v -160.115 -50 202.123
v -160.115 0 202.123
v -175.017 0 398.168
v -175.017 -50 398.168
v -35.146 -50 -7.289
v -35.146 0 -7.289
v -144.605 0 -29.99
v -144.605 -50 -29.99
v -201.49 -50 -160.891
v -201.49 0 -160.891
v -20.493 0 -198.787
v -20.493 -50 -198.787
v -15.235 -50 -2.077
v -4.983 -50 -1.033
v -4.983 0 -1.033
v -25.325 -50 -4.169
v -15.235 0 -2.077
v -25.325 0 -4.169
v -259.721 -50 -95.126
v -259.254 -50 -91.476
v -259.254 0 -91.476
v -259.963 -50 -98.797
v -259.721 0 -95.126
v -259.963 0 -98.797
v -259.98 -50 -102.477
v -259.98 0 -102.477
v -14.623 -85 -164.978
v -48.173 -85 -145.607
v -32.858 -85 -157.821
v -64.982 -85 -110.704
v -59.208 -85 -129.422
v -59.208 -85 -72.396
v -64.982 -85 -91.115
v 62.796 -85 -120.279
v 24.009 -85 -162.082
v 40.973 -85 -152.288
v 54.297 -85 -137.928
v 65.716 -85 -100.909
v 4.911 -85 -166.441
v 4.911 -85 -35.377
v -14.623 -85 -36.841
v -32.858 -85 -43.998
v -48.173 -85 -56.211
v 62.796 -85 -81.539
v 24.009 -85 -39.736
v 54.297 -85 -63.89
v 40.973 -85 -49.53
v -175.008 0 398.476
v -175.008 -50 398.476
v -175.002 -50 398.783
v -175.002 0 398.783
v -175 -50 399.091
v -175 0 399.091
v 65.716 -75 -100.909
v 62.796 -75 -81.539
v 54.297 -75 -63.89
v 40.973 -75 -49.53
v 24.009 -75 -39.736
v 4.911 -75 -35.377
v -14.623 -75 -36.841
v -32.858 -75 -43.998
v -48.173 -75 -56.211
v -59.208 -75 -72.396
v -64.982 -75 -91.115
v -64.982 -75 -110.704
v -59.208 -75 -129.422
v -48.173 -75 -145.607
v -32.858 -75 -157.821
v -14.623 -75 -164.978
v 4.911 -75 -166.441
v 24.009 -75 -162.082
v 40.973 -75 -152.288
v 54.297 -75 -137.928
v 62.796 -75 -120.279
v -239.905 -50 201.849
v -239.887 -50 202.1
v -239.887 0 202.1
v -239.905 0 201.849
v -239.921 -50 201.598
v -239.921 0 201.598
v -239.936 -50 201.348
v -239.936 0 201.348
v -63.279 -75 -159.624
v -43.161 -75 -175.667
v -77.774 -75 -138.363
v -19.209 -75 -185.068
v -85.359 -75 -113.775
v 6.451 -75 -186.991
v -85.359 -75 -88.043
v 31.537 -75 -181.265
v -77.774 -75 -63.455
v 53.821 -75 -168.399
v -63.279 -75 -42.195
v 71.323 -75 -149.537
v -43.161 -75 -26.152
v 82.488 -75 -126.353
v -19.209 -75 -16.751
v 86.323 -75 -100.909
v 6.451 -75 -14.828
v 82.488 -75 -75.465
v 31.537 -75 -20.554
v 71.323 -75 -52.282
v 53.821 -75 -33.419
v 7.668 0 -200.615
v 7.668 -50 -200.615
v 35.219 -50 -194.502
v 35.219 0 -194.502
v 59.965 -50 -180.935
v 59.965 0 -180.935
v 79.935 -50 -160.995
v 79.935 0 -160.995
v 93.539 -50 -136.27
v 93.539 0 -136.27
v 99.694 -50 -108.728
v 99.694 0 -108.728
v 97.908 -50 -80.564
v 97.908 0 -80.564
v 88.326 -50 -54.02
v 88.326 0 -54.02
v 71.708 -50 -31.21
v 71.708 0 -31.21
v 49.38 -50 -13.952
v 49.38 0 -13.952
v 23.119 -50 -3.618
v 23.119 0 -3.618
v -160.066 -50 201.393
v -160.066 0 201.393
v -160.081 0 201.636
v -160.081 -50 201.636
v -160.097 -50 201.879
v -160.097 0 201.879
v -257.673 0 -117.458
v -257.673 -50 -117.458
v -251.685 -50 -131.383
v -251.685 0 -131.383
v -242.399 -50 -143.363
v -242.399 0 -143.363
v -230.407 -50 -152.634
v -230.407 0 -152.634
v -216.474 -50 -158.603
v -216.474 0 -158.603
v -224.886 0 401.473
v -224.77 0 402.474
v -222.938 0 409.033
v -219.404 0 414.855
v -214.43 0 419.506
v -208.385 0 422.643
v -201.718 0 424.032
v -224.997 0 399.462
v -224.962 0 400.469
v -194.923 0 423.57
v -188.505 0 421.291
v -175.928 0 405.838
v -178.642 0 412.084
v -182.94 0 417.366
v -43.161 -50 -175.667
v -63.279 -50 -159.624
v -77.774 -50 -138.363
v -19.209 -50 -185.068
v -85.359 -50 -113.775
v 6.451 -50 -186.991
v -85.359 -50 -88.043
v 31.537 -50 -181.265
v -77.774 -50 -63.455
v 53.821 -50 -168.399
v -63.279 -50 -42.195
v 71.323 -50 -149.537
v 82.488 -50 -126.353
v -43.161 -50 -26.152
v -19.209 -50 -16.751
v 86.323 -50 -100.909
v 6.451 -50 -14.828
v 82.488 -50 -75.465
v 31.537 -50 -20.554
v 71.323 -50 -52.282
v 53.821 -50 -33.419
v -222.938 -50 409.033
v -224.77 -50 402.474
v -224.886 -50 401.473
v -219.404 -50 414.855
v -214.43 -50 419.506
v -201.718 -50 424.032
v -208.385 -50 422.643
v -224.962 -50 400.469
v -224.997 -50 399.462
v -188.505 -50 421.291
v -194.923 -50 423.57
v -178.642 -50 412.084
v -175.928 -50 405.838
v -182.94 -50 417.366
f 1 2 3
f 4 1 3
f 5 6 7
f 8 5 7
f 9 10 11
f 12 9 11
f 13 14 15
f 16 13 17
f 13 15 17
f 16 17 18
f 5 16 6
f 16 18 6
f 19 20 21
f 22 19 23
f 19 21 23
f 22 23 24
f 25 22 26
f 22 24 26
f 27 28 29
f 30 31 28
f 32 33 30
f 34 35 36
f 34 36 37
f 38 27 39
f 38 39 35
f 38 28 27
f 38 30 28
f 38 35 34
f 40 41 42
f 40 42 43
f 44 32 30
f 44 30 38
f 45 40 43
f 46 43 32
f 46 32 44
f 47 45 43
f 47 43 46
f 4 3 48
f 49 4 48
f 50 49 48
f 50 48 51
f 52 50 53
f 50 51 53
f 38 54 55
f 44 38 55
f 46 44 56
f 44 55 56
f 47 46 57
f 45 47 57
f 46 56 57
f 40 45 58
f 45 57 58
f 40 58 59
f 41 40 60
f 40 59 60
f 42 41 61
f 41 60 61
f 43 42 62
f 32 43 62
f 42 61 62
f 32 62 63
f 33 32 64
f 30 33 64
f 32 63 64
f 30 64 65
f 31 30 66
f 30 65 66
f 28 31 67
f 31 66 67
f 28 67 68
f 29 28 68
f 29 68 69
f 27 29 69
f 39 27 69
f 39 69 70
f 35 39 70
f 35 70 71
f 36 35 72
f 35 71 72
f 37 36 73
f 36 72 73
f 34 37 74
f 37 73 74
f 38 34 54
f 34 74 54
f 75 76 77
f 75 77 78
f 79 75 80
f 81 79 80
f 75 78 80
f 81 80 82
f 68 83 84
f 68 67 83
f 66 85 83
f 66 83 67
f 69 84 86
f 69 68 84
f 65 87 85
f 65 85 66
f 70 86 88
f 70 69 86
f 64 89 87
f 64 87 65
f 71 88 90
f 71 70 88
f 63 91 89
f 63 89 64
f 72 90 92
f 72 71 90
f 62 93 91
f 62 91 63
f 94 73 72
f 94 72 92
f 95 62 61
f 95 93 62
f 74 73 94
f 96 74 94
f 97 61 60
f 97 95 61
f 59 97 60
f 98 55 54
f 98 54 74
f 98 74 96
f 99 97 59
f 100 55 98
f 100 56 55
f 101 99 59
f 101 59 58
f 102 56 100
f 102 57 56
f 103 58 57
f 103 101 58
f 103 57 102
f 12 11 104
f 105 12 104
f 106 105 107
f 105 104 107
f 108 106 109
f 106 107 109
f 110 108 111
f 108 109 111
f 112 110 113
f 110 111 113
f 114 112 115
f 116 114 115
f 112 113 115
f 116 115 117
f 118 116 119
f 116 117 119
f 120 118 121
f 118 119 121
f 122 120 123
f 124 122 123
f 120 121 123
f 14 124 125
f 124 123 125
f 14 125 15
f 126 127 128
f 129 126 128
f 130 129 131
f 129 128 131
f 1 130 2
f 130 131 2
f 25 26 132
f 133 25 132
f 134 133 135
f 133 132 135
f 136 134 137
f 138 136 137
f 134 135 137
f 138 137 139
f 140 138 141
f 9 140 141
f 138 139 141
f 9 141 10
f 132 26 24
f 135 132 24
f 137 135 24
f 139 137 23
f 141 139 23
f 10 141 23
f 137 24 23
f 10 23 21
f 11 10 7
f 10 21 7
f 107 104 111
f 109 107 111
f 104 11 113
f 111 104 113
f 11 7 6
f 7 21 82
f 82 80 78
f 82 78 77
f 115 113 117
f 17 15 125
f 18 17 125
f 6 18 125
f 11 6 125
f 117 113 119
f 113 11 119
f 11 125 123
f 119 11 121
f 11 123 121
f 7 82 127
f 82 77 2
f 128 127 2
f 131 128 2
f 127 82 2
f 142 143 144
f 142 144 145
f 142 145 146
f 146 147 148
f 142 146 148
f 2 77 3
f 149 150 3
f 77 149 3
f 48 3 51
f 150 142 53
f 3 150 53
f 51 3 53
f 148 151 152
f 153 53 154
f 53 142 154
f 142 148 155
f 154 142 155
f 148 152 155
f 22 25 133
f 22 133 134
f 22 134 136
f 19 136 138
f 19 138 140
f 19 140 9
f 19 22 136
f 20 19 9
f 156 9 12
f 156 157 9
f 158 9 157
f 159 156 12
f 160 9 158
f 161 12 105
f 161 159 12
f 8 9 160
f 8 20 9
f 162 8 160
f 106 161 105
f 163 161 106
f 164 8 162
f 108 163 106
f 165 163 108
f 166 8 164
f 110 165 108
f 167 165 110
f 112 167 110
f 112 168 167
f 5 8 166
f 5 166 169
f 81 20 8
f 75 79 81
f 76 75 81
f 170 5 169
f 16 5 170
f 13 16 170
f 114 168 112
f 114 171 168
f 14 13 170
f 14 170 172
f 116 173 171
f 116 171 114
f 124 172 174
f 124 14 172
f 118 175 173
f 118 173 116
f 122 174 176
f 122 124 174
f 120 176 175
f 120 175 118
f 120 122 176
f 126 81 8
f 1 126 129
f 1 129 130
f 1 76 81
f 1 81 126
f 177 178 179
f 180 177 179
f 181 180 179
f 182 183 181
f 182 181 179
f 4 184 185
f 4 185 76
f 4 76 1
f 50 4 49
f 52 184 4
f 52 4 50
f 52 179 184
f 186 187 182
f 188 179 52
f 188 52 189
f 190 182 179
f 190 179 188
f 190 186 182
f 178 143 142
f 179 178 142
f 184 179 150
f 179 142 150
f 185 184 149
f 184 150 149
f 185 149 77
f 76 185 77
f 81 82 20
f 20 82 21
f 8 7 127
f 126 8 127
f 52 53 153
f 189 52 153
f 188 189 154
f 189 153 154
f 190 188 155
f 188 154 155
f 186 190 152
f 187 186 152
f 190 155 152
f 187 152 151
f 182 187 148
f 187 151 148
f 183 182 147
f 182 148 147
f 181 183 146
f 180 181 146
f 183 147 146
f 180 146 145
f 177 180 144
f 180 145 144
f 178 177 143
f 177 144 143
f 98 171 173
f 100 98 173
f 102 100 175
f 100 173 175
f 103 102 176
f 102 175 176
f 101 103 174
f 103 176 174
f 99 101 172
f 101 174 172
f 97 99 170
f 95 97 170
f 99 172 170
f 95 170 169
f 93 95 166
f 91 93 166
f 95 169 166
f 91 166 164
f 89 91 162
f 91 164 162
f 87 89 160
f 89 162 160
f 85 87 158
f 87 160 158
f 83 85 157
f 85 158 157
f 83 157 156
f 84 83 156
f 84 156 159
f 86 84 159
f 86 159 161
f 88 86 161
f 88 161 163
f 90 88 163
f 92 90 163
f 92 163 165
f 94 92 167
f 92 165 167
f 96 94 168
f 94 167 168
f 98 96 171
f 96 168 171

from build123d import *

# Parameters (mm, degrees)
F1_DEPTH = 50
F2_R     = 86.3227416046
F3_DEPTH = 25
F4_R     = 65.7159407402
F5_DEPTH = 10


with BuildPart() as f1:
    # F0 (on Front) → F1 (new body)
    with BuildSketch(Plane.XZ):
        with BuildLine():
            ThreePointArc((-20.4931345241, -198.7868681146), (63.0503233441, -178.5278953222), (100, -100.9092330933))
            ThreePointArc((100, -100.9092330933), (68.9263499461, -28.4581579936), (-4.983165662, -1.0334699673))
            Line((-4.983165662, -1.0334699673), (-35.1463871142, -7.2890885045))
            ThreePointArc((-35.1463871142, -7.2890885045), (-99.7085201522, -108.5388470457), (-20.4931345241, -198.7868681146))
        make_face()
        with BuildLine():
            Line((-35.1463871142, -7.2890885045), (-4.983165662, -1.0334699673))
            ThreePointArc((-4.983165662, -1.0334699673), (-20.307103248, -2.9928322317), (-35.1463871142, -7.2890885045))
        make_face()
        with BuildLine():
            Line((-201.4895329203, -160.8907410076), (-20.4931345241, -198.7868681146))
            ThreePointArc((-20.4931345241, -198.7868681146), (-99.7085201522, -108.5388470457), (-35.1463871142, -7.2890885045))
            Line((-35.1463871142, -7.2890885045), (-144.6050883957, -29.989975473))
            Line((-144.6050883957, -29.989975473), (-140.1335041643, -96.908898563))
            ThreePointArc((-140.1335041643, -96.908898563), (-140.0333853292, -98.9079522711), (-140, -100.9092330933))
            ThreePointArc((-140, -100.9092330933), (-158.1035322206, -143.8590408648), (-201.4895329203, -160.8907410076))
        make_face()
        with BuildLine():
            ThreePointArc((-259.9795126124, -102.4770553995), (-242.3987093701, -143.3633193954), (-201.4895329203, -160.8907410076))
            ThreePointArc((-201.4895329203, -160.8907410076), (-158.1035322206, -143.8590408648), (-140, -100.9092330933))
            ThreePointArc((-140, -100.9092330933), (-140.0333853292, -98.9079522711), (-140.1335041643, -96.908898563))
            ThreePointArc((-140.1335041643, -96.908898563), (-158.1101162428, -57.9530037568), (-197.505495076, -40.9611101436))
            ThreePointArc((-197.505495076, -40.9611101436), (-237.9912102248, -54.4692939713), (-259.2537512084, -91.4756246778))
            Line((-259.2537512084, -91.4756246778), (-259.9795126124, -102.4770553995))
        make_face()
        with BuildLine():
            Line((-140.1335041643, -96.908898563), (-144.6050883957, -29.989975473))
            Line((-144.6050883957, -29.989975473), (-197.505495076, -40.9611101436))
            ThreePointArc((-197.505495076, -40.9611101436), (-158.1101162428, -57.9530037568), (-140.1335041643, -96.908898563))
        make_face()
        with BuildLine():
            Line((-197.505495076, -40.9611101436), (-144.6050883957, -29.989975473))
            Line((-144.6050883957, -29.989975473), (-160.0662830286, 201.3925594364))
            ThreePointArc((-160.0662830286, 201.3925594364), (-160.016574191, 200.2421402486), (-160, 199.0907669067))
            ThreePointArc((-160, 199.0907669067), (-201.1288321578, 159.1066983549), (-239.936286898, 201.3475320257))
            Line((-239.936286898, 201.3475320257), (-259.2537512084, -91.4756246778))
            ThreePointArc((-259.2537512084, -91.4756246778), (-237.9912102248, -54.4692939713), (-197.505495076, -40.9611101436))
        make_face()
        with BuildLine():
            ThreePointArc((-259.2537512084, -91.4756246778), (-259.8698644546, -96.9596343563), (-259.9795126124, -102.4770553995))
            Line((-259.9795126124, -102.4770553995), (-259.2537512084, -91.4756246778))
        make_face()
        with BuildLine():
            Line((-160.1150603833, 202.1225307119), (-160.0662830286, 201.3925594364))
            ThreePointArc((-160.0662830286, 201.3925594364), (-160.0890027762, 201.7576565936), (-160.1150603833, 202.1225307119))
        make_face()
        with BuildLine():
            ThreePointArc((-160, 199.0907669067), (-160.016574191, 200.2421402486), (-160.0662830286, 201.3925594364))
            Line((-160.0662830286, 201.3925594364), (-160.1150603833, 202.1225307119))
            ThreePointArc((-160.1150603833, 202.1225307119), (-200.0113479884, 239.090765297), (-239.8866534174, 202.0998995332))
            Line((-239.8866534174, 202.0998995332), (-239.936286898, 201.3475320257))
            ThreePointArc((-239.936286898, 201.3475320257), (-201.1288321578, 159.1066983549), (-160, 199.0907669067))
        make_face()
        with BuildLine():
            ThreePointArc((-239.8866534174, 202.0998995332), (-200.0113479884, 239.090765297), (-160.1150603833, 202.1225307119))
            Line((-160.1150603833, 202.1225307119), (-175.0170289676, 398.1681844469))
            ThreePointArc((-175.0170289676, 398.1681844469), (-200.6469460036, 374.0991390912), (-224.9972436015, 399.4619977333))
            Line((-224.9972436015, 399.4619977333), (-239.8866534174, 202.0998995332))
        make_face()
        with BuildLine():
            ThreePointArc((-239.8866534174, 202.0998995332), (-239.9132429698, 201.7238327314), (-239.936286898, 201.3475320257))
            Line((-239.936286898, 201.3475320257), (-239.8866534174, 202.0998995332))
        make_face()
        with BuildLine():
            ThreePointArc((-224.9972436015, 399.4619977333), (-200.6469460036, 374.0991390912), (-175.0170289676, 398.1681844469))
            ThreePointArc((-175.0170289676, 398.1681844469), (-175.0042576044, 398.6293971036), (-175, 399.0907669067))
            ThreePointArc((-175, 399.0907669067), (-198.3044384925, 424.033202056), (-224.7700056939, 402.4740815422))
            Line((-224.7700056939, 402.4740815422), (-224.9972436015, 399.4619977333))
        make_face()
        with BuildLine():
            ThreePointArc((-224.7700056939, 402.4740815422), (-224.9291583858, 400.9714747983), (-224.9972436015, 399.4619977333))
            Line((-224.9972436015, 399.4619977333), (-224.7700056939, 402.4740815422))
        make_face()
    extrude(amount=F1_DEPTH)

    # F2 (on face) → F3 (join)
    with BuildSketch(Plane.XZ.offset(50)):
        with Locations((0, -100.9092330933)):
            Circle(F2_R)
    extrude(amount=F3_DEPTH)

    # F4 (on face) → F5 (join)
    with BuildSketch(Plane.XZ.offset(75)):
        with Locations((0, -100.9092330933)):
            Circle(F4_R)
    extrude(amount=F5_DEPTH)


solid = f1.part
